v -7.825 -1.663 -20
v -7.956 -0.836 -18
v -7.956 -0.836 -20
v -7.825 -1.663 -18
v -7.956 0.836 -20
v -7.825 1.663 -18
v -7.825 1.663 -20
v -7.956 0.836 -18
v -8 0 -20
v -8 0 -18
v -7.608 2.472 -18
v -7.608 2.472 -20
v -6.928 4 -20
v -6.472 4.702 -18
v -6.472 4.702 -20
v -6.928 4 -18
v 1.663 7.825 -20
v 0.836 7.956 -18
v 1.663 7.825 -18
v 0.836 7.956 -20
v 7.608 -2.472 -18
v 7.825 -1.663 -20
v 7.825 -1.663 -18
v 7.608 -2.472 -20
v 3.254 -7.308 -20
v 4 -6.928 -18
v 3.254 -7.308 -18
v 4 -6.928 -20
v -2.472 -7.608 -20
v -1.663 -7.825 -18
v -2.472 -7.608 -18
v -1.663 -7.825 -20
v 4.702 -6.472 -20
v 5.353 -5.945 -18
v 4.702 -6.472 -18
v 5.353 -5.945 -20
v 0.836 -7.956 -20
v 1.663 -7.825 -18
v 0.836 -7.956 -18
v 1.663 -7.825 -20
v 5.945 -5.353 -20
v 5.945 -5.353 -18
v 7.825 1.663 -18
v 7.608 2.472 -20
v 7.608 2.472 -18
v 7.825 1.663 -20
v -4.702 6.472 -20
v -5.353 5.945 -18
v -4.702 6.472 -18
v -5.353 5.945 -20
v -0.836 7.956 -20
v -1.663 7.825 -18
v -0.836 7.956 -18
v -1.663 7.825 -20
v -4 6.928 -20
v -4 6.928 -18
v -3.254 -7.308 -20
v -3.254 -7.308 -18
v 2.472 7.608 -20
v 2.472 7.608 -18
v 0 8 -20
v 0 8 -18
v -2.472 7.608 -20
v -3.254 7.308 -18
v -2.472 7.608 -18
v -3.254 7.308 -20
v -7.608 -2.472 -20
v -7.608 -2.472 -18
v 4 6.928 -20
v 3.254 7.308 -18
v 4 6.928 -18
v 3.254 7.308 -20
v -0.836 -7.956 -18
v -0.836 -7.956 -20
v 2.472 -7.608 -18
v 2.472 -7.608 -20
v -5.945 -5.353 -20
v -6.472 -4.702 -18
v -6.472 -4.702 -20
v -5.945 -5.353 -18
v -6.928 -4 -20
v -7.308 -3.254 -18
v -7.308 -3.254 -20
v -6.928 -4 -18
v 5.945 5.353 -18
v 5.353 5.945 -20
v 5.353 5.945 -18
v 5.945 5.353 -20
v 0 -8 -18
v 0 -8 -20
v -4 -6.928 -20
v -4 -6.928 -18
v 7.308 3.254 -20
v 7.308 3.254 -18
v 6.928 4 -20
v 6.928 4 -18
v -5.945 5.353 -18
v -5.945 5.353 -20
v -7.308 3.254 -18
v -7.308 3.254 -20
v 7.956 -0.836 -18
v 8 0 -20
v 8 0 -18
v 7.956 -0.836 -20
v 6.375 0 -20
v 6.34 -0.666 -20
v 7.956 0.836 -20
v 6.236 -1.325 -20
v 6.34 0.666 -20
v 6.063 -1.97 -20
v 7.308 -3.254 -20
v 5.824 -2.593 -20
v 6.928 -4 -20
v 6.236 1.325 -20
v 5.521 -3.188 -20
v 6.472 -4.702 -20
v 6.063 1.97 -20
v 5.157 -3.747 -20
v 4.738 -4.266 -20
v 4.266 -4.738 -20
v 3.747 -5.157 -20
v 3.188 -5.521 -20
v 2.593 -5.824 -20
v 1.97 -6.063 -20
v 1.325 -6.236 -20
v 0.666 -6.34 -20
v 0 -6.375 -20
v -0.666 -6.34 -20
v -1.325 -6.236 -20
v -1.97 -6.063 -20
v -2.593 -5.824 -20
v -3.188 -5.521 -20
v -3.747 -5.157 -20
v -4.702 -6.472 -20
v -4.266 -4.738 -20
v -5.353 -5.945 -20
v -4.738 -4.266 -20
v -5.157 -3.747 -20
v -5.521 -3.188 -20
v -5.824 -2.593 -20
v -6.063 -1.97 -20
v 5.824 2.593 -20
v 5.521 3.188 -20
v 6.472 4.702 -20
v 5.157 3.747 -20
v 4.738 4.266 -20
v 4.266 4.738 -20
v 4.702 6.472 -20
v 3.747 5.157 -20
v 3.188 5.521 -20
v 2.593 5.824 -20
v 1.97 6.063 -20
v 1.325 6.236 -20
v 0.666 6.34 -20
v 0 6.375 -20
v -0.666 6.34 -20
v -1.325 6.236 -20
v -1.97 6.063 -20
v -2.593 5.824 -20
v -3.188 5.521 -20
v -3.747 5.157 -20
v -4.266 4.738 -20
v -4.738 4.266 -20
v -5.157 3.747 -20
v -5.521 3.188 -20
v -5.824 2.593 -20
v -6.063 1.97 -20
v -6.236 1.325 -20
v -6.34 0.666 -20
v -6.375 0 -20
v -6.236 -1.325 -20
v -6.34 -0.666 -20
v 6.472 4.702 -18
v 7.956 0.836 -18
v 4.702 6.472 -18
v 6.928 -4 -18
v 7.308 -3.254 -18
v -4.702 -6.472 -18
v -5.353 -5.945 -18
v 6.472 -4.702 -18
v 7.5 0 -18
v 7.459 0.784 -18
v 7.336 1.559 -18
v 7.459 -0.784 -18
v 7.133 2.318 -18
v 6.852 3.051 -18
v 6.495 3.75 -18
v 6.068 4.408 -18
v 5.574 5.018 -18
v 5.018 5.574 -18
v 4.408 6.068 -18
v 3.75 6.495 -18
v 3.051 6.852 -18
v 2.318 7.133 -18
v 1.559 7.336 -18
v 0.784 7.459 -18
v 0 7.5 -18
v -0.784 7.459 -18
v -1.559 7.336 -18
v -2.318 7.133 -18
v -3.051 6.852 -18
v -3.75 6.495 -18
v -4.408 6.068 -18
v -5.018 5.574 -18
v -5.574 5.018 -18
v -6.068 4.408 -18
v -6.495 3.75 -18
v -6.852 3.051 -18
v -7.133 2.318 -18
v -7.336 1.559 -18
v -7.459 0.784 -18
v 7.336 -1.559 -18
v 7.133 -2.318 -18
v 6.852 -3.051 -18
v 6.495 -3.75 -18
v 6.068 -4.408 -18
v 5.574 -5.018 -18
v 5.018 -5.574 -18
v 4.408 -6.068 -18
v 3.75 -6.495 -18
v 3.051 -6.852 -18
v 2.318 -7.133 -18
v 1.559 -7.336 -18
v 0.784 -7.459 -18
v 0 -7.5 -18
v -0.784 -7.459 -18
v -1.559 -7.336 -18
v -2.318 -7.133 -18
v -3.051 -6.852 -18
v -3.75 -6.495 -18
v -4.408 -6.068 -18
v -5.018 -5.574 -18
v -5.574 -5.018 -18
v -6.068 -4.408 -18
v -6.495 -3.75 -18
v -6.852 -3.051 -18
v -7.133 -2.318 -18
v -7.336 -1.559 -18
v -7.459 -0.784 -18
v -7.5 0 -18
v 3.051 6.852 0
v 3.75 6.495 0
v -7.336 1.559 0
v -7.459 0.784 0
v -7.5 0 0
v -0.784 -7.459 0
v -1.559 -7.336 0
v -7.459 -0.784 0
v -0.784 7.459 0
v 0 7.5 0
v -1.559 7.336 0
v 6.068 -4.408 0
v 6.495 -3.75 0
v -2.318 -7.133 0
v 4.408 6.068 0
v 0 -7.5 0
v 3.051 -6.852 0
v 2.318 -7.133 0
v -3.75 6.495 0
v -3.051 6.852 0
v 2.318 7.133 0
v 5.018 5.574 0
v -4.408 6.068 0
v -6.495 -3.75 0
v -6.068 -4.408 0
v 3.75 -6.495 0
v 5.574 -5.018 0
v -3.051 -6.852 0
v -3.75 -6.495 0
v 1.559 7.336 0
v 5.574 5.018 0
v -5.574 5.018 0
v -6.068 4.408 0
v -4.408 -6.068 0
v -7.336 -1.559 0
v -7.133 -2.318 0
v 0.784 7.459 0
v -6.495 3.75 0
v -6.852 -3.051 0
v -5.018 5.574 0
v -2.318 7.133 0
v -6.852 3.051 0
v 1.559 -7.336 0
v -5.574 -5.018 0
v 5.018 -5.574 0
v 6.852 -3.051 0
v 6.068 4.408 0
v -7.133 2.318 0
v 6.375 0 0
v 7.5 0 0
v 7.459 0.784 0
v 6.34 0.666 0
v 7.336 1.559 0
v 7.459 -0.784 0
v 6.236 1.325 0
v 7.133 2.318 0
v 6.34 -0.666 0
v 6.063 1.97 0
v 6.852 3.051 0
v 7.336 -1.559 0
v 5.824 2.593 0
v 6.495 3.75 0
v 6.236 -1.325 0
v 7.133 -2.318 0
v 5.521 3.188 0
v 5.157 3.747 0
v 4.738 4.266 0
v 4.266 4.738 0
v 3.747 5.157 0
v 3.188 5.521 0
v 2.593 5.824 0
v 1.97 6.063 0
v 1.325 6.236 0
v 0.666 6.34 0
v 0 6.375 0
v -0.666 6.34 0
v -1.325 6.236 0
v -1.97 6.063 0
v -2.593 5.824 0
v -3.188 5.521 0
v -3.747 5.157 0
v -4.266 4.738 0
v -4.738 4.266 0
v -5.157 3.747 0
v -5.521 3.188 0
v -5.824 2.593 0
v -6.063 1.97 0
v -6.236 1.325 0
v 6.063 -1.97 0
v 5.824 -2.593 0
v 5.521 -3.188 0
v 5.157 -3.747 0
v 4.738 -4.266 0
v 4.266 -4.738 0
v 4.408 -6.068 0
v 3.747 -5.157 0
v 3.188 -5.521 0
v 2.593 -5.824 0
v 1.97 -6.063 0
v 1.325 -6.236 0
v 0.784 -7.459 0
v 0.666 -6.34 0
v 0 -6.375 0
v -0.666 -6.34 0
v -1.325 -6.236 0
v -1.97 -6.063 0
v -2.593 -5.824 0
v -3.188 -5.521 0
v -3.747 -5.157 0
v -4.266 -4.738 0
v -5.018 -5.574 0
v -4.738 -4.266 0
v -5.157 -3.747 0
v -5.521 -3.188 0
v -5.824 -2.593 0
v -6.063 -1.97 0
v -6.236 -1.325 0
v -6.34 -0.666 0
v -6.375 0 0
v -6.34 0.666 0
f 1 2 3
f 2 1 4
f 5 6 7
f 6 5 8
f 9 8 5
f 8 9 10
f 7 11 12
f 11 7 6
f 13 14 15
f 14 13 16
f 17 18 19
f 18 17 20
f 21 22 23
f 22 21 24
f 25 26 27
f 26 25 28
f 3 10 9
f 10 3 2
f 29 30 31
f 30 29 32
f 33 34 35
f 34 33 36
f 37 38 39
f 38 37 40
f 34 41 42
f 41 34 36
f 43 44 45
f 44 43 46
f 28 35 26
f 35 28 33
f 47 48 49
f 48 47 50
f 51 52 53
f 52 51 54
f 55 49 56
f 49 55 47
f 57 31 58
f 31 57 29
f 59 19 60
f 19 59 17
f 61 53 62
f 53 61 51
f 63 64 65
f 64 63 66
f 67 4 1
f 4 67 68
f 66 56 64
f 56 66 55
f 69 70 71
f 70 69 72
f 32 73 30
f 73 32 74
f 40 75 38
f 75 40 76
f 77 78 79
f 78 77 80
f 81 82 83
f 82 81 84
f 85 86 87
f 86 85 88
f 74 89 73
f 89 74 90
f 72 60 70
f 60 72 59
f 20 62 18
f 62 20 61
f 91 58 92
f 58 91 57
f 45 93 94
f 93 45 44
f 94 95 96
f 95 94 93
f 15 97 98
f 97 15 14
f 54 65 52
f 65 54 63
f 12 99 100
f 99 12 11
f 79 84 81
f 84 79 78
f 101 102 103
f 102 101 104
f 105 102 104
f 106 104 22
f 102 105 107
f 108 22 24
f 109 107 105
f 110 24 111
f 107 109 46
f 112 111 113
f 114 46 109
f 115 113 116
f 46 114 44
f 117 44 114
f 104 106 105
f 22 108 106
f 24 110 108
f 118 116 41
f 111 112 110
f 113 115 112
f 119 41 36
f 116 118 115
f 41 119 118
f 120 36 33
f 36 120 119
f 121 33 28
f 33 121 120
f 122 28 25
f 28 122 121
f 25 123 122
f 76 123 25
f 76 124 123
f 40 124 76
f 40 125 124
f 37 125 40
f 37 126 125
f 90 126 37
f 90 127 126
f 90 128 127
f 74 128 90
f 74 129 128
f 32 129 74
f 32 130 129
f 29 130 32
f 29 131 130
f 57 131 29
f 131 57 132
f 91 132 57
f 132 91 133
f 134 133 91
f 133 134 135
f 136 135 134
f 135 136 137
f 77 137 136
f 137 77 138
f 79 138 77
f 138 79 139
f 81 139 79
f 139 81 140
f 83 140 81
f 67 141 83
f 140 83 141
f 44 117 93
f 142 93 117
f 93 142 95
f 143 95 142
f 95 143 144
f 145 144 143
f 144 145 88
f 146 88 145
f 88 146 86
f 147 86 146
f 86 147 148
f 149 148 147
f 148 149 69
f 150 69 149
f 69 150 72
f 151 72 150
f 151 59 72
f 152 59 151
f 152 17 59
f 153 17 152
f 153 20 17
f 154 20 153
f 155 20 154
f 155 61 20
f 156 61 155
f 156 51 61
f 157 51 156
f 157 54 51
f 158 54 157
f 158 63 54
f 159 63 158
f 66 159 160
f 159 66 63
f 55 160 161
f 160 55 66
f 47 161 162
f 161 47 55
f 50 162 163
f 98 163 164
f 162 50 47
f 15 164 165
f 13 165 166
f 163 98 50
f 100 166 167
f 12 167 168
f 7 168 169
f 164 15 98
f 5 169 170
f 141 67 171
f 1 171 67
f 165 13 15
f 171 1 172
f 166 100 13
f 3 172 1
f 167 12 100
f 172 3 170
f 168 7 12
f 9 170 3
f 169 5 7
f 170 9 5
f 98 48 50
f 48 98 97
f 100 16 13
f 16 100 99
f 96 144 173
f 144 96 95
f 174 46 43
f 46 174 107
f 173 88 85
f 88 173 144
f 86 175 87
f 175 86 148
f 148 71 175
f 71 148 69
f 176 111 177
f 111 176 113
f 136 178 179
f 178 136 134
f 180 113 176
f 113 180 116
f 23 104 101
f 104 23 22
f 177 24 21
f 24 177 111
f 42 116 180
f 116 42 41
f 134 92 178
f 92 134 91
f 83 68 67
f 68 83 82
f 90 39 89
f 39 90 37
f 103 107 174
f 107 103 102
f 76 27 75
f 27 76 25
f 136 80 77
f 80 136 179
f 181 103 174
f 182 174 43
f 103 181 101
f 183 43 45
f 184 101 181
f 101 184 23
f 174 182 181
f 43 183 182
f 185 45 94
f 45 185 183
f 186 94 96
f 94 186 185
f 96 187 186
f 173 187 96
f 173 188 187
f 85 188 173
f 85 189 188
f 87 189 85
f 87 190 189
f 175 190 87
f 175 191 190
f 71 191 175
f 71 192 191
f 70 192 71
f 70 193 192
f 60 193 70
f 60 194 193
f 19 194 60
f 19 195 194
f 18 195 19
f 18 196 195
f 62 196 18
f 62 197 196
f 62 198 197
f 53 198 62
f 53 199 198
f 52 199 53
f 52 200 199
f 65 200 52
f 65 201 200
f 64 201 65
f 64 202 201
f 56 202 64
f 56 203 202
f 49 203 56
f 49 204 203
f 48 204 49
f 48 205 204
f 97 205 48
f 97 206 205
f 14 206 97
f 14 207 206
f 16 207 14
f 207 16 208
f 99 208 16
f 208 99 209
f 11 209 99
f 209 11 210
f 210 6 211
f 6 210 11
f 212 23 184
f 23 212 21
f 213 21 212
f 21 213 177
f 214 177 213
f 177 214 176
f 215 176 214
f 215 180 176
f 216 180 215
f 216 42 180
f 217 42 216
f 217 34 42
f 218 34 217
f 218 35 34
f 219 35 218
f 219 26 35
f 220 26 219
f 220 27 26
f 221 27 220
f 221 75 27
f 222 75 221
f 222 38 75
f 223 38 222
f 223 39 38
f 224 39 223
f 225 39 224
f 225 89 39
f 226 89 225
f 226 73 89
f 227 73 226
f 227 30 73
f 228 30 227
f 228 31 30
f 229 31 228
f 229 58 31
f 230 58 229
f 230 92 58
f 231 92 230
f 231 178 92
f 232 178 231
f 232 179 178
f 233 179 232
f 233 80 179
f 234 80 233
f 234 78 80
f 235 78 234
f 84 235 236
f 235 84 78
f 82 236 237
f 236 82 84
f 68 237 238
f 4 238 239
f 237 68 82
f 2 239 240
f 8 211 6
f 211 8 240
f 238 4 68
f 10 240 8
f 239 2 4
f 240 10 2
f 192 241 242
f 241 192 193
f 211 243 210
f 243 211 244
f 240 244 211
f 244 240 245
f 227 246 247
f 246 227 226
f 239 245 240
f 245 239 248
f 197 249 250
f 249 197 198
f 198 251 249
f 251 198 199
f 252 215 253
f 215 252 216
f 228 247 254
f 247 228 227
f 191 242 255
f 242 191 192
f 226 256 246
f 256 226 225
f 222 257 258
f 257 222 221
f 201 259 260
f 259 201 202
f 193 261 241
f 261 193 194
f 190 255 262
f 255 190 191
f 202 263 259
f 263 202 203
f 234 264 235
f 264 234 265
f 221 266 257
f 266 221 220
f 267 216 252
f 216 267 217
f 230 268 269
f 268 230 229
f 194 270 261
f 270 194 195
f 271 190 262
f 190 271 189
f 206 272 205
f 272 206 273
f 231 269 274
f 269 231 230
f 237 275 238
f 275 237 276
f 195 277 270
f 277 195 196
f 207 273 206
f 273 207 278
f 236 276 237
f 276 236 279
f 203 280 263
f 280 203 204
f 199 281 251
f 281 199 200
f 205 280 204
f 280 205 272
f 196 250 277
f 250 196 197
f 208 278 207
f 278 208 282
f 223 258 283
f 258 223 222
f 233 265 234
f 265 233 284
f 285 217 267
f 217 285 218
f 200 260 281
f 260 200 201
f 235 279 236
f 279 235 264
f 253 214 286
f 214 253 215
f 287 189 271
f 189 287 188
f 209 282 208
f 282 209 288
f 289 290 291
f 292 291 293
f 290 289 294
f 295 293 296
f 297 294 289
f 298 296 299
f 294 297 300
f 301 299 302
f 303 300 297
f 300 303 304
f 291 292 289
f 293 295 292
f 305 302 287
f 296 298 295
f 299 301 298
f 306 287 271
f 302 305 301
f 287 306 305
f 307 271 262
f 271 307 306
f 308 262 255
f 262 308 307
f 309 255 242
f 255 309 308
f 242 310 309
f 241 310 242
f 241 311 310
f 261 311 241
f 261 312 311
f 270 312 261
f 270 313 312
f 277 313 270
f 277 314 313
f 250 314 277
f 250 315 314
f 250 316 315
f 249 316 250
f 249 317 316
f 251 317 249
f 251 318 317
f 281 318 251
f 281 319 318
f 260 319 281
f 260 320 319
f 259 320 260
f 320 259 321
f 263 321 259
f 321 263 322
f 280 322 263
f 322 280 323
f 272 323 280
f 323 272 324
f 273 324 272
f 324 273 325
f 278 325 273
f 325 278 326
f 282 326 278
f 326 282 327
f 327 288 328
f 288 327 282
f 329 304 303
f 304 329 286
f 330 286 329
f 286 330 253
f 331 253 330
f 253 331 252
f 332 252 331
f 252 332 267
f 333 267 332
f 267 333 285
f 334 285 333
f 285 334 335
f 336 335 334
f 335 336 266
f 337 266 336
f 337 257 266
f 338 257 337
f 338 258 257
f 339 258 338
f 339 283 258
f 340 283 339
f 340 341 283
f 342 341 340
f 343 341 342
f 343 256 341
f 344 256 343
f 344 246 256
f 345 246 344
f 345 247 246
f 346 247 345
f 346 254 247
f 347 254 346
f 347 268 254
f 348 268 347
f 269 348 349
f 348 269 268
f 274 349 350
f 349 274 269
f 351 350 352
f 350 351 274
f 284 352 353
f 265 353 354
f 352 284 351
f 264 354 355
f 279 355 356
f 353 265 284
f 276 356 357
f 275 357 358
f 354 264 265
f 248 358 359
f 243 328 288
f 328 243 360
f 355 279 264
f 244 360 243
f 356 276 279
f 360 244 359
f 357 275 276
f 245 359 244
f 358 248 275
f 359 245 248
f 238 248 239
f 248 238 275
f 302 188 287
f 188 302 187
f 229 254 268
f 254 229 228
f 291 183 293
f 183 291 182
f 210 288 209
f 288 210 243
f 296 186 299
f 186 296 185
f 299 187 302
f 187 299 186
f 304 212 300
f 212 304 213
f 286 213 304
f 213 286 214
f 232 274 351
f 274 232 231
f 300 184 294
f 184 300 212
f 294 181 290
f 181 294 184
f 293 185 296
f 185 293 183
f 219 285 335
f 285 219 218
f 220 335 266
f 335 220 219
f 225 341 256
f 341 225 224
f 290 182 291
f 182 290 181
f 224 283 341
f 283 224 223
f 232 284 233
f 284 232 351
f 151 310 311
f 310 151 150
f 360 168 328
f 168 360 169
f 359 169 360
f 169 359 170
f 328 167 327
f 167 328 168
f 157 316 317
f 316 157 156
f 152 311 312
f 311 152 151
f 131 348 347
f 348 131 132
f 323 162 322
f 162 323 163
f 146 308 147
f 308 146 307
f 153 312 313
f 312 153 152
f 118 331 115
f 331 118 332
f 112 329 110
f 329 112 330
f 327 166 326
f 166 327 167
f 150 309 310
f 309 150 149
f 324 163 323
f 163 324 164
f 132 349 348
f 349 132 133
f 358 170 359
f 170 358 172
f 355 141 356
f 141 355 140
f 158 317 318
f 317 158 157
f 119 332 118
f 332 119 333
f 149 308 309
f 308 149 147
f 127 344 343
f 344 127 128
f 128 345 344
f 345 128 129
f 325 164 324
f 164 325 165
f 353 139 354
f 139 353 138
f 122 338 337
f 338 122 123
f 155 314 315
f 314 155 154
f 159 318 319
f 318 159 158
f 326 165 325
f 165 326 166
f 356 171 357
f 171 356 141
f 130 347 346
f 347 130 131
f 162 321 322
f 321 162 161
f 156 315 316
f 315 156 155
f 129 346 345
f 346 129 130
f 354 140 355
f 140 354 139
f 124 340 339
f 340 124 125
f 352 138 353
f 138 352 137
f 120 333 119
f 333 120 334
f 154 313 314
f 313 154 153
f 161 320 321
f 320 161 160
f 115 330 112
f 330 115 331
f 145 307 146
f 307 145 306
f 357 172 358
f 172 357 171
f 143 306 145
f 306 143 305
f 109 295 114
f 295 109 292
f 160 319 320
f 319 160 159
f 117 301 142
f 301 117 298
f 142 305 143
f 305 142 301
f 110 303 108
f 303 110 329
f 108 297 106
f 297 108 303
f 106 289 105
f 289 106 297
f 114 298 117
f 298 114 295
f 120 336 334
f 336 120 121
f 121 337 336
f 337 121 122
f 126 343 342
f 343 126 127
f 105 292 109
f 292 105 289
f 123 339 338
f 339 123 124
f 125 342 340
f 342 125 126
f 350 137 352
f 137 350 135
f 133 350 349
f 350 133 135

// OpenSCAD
$fn = 60;

// Diameter of the inner tube (Measured from the outside)
innerDiameter = 12.5;

// Diameter of the outer tube (Measured from the inside)
outerDiameter = 15;

// Thickness of the tube (Determines the lip size)
tubeThickness = 1;

// The length of the adapter
height = 20;

// The length of the lip
lipHeight = 1;

// Version 2
// tubeThickness = 2;

// Version 3
// outerDiameter = 14;

// Version 4
// innerDiameter = 13.5;

lipHeight = 2;

// Version 5
// innerDiameter = 12.7;

// Version 6
innerDiameter = 12.75;

// Version 7
// innerDiameter = 13;

module adapter() {
    difference() {
        outerShell();
        cylinder(h = height, d = innerDiameter);
    }
}

module lip() {
    difference() {
        cylinder(h = height, d = outerDiameter + tubeThickness);
        cylinder(h = height - lipHeight, d = outerDiameter + tubeThickness);
    }
}

module outerShell() {
    cylinder(h = height, d = outerDiameter);
    lip();
}

rotate([0, 180, 0]) {
    adapter();
}
